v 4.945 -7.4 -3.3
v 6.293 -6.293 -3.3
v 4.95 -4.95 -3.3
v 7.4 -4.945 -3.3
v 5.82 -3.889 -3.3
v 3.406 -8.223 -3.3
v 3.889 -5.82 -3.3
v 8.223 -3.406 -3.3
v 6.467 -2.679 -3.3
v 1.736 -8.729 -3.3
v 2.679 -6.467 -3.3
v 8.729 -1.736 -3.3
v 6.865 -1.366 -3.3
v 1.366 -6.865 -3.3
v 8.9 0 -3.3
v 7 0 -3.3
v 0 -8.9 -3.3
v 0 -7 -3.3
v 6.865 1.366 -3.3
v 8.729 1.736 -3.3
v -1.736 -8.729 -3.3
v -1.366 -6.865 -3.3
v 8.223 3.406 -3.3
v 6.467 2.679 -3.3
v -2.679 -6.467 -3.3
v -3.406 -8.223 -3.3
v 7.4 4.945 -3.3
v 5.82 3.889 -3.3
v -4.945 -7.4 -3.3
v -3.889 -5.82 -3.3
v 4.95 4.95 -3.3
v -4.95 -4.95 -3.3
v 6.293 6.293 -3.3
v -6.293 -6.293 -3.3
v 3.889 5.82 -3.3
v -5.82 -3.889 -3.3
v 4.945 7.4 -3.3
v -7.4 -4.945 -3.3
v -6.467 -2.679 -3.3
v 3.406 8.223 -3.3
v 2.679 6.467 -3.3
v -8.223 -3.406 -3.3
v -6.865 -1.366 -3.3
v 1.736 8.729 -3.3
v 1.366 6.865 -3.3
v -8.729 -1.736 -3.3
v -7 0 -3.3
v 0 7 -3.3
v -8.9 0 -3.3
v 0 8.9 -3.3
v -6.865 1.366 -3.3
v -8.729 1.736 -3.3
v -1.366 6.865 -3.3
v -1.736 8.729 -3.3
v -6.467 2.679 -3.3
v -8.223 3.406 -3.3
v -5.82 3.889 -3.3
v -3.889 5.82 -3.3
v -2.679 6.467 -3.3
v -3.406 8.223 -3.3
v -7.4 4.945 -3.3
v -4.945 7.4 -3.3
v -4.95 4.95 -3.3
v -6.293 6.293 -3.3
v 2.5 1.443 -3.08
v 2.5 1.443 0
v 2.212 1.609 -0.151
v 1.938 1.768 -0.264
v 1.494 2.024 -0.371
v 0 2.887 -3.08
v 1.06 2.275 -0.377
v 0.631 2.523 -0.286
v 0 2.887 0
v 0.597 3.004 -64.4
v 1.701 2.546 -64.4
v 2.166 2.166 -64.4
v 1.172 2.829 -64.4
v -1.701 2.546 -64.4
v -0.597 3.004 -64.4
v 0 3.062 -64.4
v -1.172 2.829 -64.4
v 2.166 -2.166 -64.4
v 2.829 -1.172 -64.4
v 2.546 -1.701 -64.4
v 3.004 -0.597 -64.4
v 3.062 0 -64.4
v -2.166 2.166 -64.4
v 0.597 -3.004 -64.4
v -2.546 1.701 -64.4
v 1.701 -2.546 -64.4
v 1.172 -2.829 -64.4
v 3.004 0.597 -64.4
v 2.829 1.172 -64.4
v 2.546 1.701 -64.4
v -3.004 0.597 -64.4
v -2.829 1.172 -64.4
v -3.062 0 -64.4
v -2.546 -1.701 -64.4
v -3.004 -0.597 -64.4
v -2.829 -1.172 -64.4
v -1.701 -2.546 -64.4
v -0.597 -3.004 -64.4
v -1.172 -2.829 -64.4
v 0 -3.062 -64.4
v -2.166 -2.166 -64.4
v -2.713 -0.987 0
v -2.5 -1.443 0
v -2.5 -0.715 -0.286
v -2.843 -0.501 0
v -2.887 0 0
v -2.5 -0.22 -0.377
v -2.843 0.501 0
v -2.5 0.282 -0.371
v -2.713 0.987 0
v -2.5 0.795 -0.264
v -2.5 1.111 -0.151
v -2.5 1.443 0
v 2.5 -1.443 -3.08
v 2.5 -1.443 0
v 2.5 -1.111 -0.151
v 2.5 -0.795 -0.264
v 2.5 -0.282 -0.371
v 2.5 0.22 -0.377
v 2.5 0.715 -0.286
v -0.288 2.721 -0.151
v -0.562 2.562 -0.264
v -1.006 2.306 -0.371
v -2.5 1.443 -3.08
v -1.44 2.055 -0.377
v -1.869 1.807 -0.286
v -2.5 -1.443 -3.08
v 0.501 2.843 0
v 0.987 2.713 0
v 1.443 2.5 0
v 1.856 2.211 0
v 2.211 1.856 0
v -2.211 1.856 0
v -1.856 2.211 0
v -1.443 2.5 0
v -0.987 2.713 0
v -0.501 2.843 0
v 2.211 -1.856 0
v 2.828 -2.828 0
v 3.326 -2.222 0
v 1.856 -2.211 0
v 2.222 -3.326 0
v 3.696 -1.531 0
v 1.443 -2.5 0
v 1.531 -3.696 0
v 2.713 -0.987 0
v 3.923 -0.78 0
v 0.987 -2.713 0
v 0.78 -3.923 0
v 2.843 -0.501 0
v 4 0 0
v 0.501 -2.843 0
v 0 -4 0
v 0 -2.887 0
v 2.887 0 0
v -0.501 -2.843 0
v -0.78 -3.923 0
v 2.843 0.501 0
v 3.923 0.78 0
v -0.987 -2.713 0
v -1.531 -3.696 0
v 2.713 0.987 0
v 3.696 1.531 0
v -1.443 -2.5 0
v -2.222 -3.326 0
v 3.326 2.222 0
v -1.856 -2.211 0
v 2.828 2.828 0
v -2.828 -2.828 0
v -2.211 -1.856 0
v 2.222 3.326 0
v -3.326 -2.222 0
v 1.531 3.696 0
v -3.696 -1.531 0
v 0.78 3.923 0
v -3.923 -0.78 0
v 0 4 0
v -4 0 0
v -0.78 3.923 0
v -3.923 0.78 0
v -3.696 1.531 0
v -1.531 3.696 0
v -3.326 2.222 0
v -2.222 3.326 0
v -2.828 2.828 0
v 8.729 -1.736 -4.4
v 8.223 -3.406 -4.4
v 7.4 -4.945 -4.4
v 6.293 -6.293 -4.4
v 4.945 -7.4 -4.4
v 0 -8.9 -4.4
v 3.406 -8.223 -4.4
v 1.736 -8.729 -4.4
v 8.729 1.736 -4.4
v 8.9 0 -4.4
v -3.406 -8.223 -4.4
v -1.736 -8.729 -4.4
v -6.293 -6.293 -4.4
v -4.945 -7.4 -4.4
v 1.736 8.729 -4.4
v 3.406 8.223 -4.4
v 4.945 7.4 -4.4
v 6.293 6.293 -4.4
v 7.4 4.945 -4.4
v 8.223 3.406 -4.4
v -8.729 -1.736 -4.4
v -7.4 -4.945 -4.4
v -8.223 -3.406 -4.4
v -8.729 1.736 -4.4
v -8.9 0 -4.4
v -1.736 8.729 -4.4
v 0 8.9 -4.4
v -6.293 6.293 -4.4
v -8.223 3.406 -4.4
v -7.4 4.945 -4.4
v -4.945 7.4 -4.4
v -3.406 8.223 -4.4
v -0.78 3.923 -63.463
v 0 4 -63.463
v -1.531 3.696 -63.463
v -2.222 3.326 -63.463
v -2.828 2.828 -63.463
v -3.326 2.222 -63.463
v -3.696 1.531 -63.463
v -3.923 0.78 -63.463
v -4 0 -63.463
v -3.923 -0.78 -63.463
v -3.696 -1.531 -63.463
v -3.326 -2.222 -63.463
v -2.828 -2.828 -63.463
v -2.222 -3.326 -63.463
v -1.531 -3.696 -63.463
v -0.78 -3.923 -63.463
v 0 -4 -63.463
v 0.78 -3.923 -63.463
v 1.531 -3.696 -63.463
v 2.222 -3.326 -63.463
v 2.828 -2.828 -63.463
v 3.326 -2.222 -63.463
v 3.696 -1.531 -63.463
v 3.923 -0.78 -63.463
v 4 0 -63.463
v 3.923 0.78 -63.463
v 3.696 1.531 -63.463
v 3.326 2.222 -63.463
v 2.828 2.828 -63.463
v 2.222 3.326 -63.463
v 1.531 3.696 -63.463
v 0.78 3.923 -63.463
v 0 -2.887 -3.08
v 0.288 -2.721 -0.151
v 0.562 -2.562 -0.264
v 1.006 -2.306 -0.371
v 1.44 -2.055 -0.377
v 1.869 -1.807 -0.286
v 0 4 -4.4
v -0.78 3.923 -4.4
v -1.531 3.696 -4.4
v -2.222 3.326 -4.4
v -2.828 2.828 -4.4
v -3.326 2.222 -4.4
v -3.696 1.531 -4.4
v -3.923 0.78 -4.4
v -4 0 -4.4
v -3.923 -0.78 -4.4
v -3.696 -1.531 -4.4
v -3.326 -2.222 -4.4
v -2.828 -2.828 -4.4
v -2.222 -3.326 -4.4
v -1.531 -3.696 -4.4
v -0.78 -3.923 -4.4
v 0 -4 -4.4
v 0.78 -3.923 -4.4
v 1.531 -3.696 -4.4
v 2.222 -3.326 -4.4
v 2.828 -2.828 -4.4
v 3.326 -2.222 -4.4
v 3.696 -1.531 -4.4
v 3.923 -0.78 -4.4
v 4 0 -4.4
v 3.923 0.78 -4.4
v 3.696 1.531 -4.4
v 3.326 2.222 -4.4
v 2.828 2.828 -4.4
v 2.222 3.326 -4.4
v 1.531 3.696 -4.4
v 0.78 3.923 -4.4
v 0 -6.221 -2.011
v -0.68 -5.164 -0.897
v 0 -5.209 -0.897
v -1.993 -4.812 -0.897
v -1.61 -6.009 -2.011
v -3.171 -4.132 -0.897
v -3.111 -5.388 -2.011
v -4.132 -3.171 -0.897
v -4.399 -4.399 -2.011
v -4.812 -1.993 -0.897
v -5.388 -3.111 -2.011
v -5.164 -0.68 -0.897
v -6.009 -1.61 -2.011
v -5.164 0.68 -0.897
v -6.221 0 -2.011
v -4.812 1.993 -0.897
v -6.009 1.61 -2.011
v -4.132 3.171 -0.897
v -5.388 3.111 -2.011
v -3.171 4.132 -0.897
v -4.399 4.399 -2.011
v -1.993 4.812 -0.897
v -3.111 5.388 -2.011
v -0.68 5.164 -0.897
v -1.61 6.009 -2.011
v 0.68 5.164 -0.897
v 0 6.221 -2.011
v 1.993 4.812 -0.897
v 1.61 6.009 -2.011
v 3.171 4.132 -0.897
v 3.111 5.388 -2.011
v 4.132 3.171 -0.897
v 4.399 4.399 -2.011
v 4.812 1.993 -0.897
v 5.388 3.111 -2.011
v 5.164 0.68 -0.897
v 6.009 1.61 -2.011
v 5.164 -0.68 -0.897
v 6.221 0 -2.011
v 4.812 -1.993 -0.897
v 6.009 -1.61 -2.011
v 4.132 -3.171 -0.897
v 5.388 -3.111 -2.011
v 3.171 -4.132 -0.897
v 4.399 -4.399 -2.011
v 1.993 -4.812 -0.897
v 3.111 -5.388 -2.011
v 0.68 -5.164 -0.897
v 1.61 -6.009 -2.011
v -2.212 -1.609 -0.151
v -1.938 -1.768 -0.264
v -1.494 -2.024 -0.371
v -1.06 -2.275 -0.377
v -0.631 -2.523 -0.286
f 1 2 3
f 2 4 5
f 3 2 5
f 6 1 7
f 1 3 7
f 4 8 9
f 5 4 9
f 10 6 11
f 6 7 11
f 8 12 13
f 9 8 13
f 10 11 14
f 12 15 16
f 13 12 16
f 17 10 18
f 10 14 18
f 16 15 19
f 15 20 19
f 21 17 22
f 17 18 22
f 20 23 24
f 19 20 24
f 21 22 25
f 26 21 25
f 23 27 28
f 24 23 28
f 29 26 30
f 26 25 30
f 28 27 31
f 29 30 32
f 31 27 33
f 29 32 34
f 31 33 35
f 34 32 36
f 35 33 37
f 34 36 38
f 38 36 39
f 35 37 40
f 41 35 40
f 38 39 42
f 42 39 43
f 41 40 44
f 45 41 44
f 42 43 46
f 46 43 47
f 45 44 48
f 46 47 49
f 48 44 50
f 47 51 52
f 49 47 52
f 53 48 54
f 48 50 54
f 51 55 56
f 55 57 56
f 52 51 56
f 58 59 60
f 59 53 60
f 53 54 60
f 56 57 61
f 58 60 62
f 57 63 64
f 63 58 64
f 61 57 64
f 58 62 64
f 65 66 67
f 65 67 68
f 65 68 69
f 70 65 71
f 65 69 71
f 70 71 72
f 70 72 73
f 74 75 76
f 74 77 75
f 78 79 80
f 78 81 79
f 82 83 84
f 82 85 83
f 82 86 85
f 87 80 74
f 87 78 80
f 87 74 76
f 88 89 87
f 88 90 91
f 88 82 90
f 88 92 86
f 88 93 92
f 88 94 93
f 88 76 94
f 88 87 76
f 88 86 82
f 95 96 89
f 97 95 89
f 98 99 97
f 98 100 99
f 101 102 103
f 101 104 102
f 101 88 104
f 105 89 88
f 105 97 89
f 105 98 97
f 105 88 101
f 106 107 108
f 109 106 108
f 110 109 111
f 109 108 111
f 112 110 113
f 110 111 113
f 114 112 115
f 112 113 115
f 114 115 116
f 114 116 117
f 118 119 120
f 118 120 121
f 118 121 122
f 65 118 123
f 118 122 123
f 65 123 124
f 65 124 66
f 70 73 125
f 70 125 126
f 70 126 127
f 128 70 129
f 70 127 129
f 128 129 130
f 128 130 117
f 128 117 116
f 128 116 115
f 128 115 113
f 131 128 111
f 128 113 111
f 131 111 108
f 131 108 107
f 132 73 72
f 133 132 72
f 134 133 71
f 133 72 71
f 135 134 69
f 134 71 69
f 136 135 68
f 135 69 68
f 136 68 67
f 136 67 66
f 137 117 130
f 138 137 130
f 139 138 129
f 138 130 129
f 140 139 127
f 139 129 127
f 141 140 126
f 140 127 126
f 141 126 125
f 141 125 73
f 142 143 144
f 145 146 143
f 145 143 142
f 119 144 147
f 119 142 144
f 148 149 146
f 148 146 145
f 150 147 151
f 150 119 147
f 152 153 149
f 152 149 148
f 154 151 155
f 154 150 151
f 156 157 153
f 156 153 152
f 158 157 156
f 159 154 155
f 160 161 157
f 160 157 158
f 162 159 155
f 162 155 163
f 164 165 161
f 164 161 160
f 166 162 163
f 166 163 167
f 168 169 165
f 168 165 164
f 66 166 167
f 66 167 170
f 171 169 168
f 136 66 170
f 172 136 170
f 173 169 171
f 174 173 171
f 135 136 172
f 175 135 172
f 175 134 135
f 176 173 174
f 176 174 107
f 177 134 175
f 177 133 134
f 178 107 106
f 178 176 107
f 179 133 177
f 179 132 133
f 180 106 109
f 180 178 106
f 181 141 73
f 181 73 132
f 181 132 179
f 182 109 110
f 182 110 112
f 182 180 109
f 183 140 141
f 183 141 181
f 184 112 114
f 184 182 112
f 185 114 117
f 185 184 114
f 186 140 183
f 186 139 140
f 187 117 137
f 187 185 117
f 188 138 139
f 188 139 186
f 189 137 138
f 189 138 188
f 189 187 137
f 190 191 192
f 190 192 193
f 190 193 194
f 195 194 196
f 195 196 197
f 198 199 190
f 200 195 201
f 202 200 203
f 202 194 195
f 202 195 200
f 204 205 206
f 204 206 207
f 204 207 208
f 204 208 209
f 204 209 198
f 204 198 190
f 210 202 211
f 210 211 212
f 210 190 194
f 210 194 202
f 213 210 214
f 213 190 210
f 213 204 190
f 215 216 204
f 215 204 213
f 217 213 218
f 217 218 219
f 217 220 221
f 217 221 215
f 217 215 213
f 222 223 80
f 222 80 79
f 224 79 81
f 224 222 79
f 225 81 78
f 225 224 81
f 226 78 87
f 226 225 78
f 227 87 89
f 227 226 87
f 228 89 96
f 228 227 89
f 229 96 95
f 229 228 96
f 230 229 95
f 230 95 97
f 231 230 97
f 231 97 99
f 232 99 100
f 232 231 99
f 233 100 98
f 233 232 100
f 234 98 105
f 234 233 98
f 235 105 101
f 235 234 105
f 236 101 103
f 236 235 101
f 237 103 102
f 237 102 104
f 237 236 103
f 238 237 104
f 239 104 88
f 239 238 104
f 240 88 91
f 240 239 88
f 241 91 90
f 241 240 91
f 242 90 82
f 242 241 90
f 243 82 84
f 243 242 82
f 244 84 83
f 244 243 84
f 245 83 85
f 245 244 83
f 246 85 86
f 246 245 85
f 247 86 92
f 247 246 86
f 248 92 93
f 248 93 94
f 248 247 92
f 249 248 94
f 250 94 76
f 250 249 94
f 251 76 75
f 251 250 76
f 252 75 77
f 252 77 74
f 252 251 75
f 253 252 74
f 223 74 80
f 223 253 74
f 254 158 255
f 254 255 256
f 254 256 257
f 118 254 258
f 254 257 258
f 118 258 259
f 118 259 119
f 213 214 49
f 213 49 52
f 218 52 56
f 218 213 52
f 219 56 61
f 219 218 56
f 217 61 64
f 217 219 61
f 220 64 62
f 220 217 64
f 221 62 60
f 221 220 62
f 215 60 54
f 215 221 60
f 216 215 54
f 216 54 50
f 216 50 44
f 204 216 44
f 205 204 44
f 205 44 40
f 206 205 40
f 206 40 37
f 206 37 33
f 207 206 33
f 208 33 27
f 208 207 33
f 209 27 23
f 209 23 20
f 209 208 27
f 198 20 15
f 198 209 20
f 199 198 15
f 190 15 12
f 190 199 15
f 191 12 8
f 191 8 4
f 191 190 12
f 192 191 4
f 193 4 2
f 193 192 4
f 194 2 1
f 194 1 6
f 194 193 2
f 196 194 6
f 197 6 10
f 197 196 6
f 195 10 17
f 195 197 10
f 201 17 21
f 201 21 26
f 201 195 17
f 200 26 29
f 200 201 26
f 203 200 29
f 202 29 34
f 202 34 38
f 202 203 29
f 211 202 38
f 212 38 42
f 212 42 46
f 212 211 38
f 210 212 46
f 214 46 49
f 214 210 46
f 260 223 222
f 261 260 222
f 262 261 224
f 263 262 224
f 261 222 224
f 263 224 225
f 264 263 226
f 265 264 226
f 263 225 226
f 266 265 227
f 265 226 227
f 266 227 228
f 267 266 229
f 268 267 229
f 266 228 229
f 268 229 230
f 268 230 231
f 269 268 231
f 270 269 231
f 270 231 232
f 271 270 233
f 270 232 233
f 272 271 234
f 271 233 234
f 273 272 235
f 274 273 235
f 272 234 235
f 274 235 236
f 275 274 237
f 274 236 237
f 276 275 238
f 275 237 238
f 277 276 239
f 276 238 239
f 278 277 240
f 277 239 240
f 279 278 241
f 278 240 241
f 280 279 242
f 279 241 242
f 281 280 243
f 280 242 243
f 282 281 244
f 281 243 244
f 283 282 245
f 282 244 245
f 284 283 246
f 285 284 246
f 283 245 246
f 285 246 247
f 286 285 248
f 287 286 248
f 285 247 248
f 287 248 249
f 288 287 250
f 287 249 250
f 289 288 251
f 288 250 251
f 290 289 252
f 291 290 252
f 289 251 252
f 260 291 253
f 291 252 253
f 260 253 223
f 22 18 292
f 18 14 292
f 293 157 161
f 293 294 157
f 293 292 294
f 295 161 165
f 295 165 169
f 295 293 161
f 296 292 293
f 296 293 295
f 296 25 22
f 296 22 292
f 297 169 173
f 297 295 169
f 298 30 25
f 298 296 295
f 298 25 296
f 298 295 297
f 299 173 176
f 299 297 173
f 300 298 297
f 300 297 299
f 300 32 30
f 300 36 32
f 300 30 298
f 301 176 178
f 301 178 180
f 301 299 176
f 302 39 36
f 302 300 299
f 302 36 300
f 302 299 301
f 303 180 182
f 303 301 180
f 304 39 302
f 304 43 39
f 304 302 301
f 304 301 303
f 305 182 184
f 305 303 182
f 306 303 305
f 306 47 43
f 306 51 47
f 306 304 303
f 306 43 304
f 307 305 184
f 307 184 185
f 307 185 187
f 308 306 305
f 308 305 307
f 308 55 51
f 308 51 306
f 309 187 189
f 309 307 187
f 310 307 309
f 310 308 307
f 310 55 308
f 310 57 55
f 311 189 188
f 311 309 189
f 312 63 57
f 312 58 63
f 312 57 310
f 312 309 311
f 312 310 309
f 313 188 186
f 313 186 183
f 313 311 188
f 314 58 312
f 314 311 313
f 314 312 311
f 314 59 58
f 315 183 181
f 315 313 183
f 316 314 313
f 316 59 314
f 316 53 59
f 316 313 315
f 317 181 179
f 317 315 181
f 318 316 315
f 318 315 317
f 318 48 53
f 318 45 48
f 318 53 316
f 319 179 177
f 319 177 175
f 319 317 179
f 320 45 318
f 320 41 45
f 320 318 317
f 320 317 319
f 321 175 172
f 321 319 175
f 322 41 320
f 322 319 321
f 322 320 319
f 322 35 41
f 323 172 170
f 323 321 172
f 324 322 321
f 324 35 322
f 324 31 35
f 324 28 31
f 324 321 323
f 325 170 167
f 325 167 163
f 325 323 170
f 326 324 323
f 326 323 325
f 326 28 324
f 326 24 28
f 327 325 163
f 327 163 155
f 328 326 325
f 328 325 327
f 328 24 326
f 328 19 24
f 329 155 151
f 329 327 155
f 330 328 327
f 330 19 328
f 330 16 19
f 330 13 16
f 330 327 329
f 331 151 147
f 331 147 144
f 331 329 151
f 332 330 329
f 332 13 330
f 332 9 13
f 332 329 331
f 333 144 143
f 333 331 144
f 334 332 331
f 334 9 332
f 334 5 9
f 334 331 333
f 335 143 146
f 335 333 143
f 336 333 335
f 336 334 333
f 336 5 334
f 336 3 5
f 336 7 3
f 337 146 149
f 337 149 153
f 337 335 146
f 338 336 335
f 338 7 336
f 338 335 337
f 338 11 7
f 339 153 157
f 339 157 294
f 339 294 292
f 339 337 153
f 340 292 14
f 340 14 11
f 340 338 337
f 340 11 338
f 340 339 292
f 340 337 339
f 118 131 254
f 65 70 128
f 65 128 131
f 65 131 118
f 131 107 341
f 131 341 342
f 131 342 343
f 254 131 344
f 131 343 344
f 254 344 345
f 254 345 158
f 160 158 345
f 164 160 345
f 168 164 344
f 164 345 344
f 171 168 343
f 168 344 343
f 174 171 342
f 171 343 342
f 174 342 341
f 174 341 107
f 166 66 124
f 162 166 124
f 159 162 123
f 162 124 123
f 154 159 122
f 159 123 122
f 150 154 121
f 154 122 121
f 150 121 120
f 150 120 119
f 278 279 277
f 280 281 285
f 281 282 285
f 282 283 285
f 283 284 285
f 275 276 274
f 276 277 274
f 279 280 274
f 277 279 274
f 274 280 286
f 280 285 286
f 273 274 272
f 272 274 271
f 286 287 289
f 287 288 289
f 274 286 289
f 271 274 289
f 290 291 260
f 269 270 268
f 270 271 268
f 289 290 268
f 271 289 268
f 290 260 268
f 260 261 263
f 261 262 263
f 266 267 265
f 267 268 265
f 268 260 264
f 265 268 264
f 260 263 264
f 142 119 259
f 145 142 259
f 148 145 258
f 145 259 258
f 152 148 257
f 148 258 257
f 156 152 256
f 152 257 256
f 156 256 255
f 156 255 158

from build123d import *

# Parameters (mm, degrees)
SKETCH1_W           = 60
SKETCH1_H           = 4
CHAMFER1_SIZE       = 0.9375
SKETCH11_R          = 8.9
BOSS_EXTRUDE3_DEPTH = 1.1
CUT_EXTRUDE2_DEPTH  = 3.08


with BuildPart() as part:
    # Sketch1 → Revolve1 (revolve)
    with BuildSketch(Plane(origin=(0, 0, 0), x_dir=(0, 0, -1), z_dir=(1, 0, 0))):
        with Locations((34.4, 2)):
            Rectangle(SKETCH1_W, SKETCH1_H)
    revolve(axis=Axis((0, 0, -64.4), (0, 0, 1)))

    # Chamfer1
    chamfer1_edges = [part.edges().sort_by_distance(p)[0] for p in [
        (0, -4, -64.4),
    ]]
    chamfer(chamfer1_edges, length=CHAMFER1_SIZE)

    # Sketch7 → Revolve2 (revolve)
    with BuildSketch(Plane(origin=(0, 0, 0), x_dir=(0, 0, -1), z_dir=(1, 0, 0)), mode=Mode.PRIVATE) as revolve2_sk:
        with BuildLine():
            Line((3.3, 7), (4.4, 7))
            Line((4.4, 7), (4.4, 0))
            Line((4.4, 0), (0, 0))
            Line((0, 0), (0, 4))
            ThreePointArc((0, 4), (1.429846746, 5.74216858), (3.3, 7))
        make_face()
    revolve(revolve2_sk.sketch.rotate(Axis((0, 0, 0), (0, 0, -1)), 180), axis=Axis((0, 0, 0), (0, 0, -1)))

    # Sketch11 → Boss-Extrude3 (add)
    with BuildSketch(Plane(origin=(0, 0, -4.4), x_dir=(-1, 0, 0), z_dir=(0, 0, -1))):
        Circle(SKETCH11_R)
    extrude(amount=-BOSS_EXTRUDE3_DEPTH)

    # Sketch5 → Cut-Extrude2 (cut)
    with BuildSketch(Plane.XY):
        Polygon((2.5, -1.443375673), (2.5, 1.443375673), (0, 2.886751346), (-2.5, 1.443375673), (-2.5, -1.443375673), (0, -2.886751346), align=None)
    extrude(amount=-CUT_EXTRUDE2_DEPTH, mode=Mode.SUBTRACT)

    # Cut-Extrude3 cone 1 section (through the dimple's axis) → Cut-Extrude3 (revolve, cut)
    with BuildSketch(Plane(origin=(0, 0, 0), x_dir=(0, -1, 0), z_dir=(1, 0, 0))):
        Polygon((0, 0), (2.886751346, 0), (0, 2.886751346), align=None)
    revolve(axis=Axis((0, 0, 0), (0, 0, -1)), mode=Mode.SUBTRACT)


with BuildPart() as body_2:
    # Split1: the piece on the far side of the plane
    add(part.part)
    split(bisect_by=Plane(origin=(0, 0, -4.4), x_dir=(-1, 0, 0), z_dir=(0, 0, -1)), keep=Keep.BOTTOM)


with BuildPart() as part_1:
    add(part.part)

    # Split1
    split(bisect_by=Plane(origin=(0, 0, -4.4), x_dir=(-1, 0, 0), z_dir=(0, 0, -1)), keep=Keep.TOP)


solid = Compound([body_2.part, part_1.part])
